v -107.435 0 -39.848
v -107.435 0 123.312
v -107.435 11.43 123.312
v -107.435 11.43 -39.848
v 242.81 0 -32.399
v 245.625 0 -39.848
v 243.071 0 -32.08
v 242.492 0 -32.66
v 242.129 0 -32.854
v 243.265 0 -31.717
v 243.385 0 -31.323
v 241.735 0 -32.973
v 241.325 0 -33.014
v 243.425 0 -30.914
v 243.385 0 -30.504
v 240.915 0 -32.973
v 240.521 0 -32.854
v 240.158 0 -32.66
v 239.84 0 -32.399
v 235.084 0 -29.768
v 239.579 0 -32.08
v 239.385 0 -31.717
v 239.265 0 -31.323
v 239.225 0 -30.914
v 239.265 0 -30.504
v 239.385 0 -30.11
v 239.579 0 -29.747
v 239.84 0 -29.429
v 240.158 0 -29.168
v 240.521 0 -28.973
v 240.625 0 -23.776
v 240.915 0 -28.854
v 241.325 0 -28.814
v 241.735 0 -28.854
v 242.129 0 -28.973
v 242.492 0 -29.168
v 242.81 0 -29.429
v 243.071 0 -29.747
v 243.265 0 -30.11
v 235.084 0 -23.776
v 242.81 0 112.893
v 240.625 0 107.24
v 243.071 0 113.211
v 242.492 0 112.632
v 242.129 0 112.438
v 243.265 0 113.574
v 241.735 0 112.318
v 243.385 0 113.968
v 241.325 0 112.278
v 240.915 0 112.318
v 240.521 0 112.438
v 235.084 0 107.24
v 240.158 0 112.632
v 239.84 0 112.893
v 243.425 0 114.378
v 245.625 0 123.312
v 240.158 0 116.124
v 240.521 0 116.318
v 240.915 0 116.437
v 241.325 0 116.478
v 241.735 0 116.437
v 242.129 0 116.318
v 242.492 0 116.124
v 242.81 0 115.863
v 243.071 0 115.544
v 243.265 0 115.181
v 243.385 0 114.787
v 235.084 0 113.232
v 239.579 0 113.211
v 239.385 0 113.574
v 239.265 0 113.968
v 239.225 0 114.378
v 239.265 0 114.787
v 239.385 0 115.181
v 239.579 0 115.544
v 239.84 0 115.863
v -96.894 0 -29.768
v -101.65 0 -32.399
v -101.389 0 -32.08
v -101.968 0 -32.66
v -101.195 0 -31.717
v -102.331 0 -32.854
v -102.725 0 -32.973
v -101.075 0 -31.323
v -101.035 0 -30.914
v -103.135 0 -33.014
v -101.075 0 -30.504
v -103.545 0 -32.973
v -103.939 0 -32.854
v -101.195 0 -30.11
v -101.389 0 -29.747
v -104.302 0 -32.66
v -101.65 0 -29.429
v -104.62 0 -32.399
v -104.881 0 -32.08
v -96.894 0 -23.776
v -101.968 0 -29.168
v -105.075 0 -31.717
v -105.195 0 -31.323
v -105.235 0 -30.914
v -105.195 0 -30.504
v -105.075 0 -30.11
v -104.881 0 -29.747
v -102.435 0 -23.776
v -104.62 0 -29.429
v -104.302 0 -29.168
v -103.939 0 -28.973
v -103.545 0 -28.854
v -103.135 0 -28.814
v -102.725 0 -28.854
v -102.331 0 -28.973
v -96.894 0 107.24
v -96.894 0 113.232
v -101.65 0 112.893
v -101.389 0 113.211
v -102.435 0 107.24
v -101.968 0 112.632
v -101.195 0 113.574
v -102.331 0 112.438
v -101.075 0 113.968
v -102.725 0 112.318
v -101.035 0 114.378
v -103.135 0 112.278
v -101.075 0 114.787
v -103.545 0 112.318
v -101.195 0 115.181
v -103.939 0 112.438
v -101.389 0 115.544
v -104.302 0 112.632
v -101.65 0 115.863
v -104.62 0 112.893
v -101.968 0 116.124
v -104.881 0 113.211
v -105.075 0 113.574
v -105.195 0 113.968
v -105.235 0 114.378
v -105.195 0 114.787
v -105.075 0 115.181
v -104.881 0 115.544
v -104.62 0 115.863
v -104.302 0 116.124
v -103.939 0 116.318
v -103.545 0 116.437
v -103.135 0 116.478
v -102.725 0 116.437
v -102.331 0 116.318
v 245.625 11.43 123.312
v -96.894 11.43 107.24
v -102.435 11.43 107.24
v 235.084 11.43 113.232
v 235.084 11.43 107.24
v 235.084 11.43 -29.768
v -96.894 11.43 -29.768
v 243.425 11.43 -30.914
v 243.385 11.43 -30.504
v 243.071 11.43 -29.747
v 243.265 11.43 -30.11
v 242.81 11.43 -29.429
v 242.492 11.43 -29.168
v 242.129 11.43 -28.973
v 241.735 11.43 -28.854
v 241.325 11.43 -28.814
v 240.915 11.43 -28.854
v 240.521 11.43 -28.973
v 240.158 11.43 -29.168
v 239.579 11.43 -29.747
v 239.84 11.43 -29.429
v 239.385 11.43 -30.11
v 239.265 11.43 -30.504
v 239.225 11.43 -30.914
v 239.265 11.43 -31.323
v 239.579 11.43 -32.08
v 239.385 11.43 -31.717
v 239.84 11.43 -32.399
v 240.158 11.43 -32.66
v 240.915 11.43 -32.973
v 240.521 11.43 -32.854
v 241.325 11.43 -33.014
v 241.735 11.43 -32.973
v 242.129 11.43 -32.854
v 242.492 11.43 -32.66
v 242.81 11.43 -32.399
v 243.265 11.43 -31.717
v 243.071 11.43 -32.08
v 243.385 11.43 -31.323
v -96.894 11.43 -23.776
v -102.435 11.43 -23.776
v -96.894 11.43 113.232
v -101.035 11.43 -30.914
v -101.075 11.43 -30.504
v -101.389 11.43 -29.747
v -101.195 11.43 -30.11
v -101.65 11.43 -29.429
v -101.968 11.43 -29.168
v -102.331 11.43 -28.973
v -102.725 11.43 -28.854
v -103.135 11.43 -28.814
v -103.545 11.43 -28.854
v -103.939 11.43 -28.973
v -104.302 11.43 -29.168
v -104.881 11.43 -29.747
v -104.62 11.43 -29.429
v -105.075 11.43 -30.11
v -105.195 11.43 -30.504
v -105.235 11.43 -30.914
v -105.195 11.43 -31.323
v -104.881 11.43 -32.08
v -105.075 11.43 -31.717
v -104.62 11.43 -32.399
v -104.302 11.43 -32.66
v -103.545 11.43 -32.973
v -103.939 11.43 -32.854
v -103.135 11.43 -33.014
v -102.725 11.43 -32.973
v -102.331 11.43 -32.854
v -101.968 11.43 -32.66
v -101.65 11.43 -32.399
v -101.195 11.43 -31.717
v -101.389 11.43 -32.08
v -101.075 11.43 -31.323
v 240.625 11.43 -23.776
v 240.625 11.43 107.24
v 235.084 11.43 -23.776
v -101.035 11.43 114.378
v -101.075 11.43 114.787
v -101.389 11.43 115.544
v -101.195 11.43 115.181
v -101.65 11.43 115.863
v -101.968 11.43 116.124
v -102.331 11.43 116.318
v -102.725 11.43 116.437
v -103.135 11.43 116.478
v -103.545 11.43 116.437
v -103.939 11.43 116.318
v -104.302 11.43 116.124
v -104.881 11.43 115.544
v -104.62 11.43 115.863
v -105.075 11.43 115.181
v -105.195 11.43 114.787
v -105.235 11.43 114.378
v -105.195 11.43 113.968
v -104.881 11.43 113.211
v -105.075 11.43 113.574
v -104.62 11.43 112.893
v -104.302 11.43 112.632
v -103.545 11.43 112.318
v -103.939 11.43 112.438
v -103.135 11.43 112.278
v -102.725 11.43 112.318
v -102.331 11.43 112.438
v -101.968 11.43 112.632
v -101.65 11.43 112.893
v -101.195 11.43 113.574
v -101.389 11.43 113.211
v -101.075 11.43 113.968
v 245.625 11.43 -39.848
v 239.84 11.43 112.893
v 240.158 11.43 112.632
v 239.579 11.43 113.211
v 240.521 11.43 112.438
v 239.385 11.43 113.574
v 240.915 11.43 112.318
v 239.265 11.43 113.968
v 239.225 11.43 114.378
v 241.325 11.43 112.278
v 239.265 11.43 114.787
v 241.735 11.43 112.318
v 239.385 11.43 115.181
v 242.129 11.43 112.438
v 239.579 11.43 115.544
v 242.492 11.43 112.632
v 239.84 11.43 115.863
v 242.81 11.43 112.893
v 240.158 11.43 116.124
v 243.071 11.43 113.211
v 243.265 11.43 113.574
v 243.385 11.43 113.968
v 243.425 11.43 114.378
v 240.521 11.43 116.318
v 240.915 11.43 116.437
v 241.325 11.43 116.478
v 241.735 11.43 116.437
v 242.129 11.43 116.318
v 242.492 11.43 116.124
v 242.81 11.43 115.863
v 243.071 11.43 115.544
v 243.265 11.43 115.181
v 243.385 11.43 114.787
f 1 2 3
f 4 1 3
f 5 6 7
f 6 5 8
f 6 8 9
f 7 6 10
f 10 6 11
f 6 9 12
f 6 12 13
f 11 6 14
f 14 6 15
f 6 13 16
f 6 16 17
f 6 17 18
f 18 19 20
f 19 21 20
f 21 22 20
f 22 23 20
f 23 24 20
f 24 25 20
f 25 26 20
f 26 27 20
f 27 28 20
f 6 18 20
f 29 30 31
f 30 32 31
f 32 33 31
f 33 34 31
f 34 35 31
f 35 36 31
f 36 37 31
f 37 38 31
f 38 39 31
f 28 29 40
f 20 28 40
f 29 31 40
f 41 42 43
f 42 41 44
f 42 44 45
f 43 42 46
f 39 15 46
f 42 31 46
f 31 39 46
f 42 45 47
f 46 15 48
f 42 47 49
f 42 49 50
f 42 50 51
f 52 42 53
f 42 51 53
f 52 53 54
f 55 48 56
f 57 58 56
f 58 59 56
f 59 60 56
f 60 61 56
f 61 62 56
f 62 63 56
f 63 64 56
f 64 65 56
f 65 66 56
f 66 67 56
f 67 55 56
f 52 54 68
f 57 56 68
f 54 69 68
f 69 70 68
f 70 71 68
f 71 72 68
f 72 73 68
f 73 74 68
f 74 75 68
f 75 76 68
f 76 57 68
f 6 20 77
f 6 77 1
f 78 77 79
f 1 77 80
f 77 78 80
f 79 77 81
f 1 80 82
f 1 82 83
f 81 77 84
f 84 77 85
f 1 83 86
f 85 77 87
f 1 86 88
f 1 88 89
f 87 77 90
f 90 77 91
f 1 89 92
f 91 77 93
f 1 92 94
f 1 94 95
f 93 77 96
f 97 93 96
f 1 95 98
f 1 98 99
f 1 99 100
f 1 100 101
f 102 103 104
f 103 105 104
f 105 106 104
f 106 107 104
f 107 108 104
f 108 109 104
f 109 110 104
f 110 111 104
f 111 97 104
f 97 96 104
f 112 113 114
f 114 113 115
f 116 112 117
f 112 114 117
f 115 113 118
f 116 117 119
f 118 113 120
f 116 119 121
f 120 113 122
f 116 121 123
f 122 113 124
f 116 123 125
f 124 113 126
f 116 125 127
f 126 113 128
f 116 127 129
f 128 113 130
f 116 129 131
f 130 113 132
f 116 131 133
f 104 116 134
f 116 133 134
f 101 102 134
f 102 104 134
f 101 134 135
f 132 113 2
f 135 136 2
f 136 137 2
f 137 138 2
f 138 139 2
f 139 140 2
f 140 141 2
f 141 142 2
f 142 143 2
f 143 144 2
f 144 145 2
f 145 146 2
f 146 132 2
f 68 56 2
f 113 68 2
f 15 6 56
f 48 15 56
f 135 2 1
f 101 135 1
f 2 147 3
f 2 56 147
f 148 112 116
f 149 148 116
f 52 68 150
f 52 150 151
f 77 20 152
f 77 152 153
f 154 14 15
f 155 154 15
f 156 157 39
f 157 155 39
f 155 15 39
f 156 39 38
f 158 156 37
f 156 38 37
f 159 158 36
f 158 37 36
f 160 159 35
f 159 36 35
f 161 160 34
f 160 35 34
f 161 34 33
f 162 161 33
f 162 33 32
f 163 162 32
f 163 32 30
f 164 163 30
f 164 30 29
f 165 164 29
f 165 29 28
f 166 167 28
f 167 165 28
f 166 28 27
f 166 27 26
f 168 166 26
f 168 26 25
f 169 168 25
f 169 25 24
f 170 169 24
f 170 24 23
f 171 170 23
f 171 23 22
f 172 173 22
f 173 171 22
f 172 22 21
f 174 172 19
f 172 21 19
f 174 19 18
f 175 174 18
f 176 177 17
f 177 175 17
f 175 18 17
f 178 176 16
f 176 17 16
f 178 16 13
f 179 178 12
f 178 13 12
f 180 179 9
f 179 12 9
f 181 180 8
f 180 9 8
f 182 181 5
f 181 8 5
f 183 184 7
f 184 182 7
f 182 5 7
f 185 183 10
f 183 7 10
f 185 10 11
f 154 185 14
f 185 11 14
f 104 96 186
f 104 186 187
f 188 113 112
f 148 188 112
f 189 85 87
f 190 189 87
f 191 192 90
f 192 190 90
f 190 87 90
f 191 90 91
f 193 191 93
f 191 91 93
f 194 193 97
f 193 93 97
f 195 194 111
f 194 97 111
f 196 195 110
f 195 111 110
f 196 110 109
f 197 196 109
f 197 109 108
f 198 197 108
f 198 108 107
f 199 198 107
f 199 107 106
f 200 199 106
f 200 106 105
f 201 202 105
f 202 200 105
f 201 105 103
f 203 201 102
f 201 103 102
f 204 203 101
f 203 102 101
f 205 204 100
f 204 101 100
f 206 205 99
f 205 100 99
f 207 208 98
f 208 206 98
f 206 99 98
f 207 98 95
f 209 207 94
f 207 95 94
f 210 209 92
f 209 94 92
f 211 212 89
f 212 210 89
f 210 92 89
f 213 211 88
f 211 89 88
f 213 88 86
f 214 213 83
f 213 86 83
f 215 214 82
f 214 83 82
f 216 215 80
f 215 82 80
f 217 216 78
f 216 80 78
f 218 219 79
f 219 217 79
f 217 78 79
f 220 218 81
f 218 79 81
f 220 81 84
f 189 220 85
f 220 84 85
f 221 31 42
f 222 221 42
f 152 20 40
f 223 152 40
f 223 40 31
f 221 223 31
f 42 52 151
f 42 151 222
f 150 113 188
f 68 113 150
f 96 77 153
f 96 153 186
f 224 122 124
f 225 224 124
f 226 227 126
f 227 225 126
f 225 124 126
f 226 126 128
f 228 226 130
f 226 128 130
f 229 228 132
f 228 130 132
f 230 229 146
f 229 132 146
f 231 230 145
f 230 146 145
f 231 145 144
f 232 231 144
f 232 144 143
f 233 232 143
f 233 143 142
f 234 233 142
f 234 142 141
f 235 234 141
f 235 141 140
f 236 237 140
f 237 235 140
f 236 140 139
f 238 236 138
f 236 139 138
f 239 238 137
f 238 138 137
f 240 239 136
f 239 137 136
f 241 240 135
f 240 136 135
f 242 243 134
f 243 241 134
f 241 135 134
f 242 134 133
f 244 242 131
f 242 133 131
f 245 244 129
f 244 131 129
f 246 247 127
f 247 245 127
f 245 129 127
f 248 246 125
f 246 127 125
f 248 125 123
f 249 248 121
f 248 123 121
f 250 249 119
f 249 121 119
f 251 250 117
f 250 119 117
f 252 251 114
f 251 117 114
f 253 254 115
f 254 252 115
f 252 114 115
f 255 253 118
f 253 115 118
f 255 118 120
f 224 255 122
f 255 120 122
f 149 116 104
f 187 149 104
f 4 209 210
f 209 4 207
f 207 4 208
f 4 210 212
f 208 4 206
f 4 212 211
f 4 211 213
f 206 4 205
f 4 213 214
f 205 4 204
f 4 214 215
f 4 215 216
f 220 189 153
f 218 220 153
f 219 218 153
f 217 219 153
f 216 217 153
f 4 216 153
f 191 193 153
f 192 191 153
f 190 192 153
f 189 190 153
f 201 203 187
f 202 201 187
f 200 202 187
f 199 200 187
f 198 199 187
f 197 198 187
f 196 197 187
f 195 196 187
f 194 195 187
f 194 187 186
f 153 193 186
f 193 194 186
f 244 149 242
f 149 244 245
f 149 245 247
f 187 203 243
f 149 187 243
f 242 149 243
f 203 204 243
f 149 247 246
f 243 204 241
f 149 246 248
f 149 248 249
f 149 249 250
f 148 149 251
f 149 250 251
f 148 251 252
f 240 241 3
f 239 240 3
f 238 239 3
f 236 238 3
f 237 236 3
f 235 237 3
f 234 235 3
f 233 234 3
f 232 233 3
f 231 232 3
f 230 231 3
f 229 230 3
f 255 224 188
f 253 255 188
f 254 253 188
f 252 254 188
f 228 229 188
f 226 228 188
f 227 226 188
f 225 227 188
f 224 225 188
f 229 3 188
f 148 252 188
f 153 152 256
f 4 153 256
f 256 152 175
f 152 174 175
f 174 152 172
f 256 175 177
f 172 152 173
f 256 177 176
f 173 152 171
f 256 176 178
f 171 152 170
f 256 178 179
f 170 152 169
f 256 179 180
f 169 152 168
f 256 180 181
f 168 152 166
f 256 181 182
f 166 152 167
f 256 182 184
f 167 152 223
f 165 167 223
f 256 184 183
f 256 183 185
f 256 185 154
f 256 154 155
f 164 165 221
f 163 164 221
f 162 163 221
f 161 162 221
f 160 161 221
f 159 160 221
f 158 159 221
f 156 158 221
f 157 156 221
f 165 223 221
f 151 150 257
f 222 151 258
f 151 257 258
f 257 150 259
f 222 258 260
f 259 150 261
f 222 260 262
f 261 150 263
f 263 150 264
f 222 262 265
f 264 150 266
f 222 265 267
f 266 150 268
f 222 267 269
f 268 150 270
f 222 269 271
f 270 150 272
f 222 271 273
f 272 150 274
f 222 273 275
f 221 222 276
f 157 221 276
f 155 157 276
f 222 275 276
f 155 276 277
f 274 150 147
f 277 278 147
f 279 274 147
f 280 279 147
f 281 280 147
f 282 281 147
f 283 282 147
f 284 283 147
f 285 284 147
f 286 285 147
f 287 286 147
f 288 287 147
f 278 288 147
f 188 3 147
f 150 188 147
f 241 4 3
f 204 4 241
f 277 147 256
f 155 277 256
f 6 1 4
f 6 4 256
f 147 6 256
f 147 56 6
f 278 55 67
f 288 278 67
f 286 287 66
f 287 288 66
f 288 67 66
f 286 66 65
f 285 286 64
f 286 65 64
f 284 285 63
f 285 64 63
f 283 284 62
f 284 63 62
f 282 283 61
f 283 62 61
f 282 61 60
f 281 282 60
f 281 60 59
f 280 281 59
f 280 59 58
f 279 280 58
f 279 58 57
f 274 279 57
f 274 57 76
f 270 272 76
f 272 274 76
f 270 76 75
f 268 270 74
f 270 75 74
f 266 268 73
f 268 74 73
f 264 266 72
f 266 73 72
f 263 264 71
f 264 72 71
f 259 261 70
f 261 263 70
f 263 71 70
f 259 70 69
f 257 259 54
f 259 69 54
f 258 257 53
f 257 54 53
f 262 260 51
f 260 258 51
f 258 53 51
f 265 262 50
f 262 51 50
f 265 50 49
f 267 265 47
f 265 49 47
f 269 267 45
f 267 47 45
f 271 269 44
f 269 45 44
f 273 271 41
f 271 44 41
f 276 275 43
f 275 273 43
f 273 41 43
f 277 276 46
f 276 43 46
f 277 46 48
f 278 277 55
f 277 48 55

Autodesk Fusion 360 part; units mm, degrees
sketch "Sketch1" plane through (0, 0, 0) normal (0, 1, 0) x (1, 0, 0)
  line L0 (-107.4349, 34.7679) -> (245.6251, 34.7679)
  line L1 (245.6251, 34.7679) -> (245.6251, -118.2321)
  line L2 (245.6251, -118.2321) -> (-107.4349, -118.2321)
  line L3 (-107.4349, -118.2321) -> (-107.4349, 34.7679)
  line L4 (-107.4349, 34.7679) -> (245.6251, 34.7679)
  line L5 (245.6251, 34.7679) -> (245.6251, 29.7679)
  line L6 (-107.4349, 29.7679) -> (-107.4349, 34.7679)
  line L7 (245.6251, 34.7679) -> (240.6251, 34.7679)
  line L8 (157.6216, -118.2321) -> (245.6251, -118.2321)
  line L9 (245.6251, -118.2321) -> (245.6251, 34.7679)
  line L10 (245.6251, -118.2321) -> (-107.4349, -118.2321)
  line L11 (-107.4349, -118.2321) -> (-107.4349, -113.2321)
  line L12 (245.6251, -113.2321) -> (245.6251, -118.2321)
  line L13 (-107.4349, -118.2321) -> (-30.4984, -118.2321)
  line L14 (-102.4349, 34.7679) -> (-107.4349, 34.7679)
  line L15 (-107.4349, 34.7679) -> (-107.4349, -118.2321)
  line L16 (-107.4349, -118.2321) -> (-24.9576, -118.2321)
  line L17 (-96.894, -113.2321) -> (-96.894, -107.2397)
  line L18 (-96.894, -107.2397) -> (-102.4349, -107.2397)
  line L19 (-107.4349, -107.2397) -> (-107.4349, -118.2321)
  circle A0 centre (-103.1349, -114.3777) radius 2.1
  line L20 (-106.1349, -119.3752) -> (-99.8349, -119.3752)
  line L21 (69.0951, -118.2321) -> (69.0951, 34.7679) construction
  line L22 (245.6251, -41.7321) -> (-107.4349, -41.7321) construction
  line L23 (235.0843, -113.2321) -> (235.0843, -107.2397)
  line L24 (235.0843, -107.2397) -> (240.6251, -107.2397)
  circle A1 centre (241.3251, -114.3777) radius 2.1
  line L25 (-96.894, -113.2321) -> (235.0843, -113.2321)
  circle A2 centre (-103.1349, 30.9136) radius 2.1
  line L26 (-96.894, 29.7679) -> (-96.894, 23.7756)
  line L27 (-96.894, 23.7756) -> (-102.4349, 23.7756)
  line L28 (235.0843, 23.7756) -> (240.6251, 23.7756)
  line L29 (235.0843, 29.7679) -> (235.0843, 23.7756)
  circle A3 centre (241.3251, 30.9136) radius 2.1
  line L30 (240.6251, 23.7756) -> (240.6251, -107.2397)
  line L31 (235.0843, 29.7679) -> (-96.894, 29.7679)
  line L32 (-102.4349, -107.2397) -> (-102.4349, 23.7756)
  dimension "d1" = 153
  dimension "d2" = 353.06
  dimension "d3" = 5
  dimension "d4" = 5
  dimension "d5" = 5
  dimension "d6" = 5
  dimension "d8" = 4.2
  dimension "d9" = 4.3
  dimension "d10" = 6.3
  dimension "d11" = 1.3
  dimension "d14" = 3.8543
  dimension "d15" = 10.5408
  dimension "d16" = 10.9923
  dimension "d17" = 5
  dimension "d18" = 5
  dimension "d19" = 5
extrude "Extrude1" add sketch "Sketch1" along normal blind 11.43
extrude "Extrude2" add 4 faces at (216.2906, 3.81, 118.2321) (96.7618, 3.81, 118.2321) (-26.8045, 3.81, 118.2321) (-56.1439, 3.81, 118.2321) along direction (0, 0, 1) blind 5.08
extrude "Extrude3" add 1 faces at (127.9385, 7.62, -34.7679) along direction (0, 0, -1) blind 5.08
equation "d9 = 1.8 mm + 2.5 mm"
